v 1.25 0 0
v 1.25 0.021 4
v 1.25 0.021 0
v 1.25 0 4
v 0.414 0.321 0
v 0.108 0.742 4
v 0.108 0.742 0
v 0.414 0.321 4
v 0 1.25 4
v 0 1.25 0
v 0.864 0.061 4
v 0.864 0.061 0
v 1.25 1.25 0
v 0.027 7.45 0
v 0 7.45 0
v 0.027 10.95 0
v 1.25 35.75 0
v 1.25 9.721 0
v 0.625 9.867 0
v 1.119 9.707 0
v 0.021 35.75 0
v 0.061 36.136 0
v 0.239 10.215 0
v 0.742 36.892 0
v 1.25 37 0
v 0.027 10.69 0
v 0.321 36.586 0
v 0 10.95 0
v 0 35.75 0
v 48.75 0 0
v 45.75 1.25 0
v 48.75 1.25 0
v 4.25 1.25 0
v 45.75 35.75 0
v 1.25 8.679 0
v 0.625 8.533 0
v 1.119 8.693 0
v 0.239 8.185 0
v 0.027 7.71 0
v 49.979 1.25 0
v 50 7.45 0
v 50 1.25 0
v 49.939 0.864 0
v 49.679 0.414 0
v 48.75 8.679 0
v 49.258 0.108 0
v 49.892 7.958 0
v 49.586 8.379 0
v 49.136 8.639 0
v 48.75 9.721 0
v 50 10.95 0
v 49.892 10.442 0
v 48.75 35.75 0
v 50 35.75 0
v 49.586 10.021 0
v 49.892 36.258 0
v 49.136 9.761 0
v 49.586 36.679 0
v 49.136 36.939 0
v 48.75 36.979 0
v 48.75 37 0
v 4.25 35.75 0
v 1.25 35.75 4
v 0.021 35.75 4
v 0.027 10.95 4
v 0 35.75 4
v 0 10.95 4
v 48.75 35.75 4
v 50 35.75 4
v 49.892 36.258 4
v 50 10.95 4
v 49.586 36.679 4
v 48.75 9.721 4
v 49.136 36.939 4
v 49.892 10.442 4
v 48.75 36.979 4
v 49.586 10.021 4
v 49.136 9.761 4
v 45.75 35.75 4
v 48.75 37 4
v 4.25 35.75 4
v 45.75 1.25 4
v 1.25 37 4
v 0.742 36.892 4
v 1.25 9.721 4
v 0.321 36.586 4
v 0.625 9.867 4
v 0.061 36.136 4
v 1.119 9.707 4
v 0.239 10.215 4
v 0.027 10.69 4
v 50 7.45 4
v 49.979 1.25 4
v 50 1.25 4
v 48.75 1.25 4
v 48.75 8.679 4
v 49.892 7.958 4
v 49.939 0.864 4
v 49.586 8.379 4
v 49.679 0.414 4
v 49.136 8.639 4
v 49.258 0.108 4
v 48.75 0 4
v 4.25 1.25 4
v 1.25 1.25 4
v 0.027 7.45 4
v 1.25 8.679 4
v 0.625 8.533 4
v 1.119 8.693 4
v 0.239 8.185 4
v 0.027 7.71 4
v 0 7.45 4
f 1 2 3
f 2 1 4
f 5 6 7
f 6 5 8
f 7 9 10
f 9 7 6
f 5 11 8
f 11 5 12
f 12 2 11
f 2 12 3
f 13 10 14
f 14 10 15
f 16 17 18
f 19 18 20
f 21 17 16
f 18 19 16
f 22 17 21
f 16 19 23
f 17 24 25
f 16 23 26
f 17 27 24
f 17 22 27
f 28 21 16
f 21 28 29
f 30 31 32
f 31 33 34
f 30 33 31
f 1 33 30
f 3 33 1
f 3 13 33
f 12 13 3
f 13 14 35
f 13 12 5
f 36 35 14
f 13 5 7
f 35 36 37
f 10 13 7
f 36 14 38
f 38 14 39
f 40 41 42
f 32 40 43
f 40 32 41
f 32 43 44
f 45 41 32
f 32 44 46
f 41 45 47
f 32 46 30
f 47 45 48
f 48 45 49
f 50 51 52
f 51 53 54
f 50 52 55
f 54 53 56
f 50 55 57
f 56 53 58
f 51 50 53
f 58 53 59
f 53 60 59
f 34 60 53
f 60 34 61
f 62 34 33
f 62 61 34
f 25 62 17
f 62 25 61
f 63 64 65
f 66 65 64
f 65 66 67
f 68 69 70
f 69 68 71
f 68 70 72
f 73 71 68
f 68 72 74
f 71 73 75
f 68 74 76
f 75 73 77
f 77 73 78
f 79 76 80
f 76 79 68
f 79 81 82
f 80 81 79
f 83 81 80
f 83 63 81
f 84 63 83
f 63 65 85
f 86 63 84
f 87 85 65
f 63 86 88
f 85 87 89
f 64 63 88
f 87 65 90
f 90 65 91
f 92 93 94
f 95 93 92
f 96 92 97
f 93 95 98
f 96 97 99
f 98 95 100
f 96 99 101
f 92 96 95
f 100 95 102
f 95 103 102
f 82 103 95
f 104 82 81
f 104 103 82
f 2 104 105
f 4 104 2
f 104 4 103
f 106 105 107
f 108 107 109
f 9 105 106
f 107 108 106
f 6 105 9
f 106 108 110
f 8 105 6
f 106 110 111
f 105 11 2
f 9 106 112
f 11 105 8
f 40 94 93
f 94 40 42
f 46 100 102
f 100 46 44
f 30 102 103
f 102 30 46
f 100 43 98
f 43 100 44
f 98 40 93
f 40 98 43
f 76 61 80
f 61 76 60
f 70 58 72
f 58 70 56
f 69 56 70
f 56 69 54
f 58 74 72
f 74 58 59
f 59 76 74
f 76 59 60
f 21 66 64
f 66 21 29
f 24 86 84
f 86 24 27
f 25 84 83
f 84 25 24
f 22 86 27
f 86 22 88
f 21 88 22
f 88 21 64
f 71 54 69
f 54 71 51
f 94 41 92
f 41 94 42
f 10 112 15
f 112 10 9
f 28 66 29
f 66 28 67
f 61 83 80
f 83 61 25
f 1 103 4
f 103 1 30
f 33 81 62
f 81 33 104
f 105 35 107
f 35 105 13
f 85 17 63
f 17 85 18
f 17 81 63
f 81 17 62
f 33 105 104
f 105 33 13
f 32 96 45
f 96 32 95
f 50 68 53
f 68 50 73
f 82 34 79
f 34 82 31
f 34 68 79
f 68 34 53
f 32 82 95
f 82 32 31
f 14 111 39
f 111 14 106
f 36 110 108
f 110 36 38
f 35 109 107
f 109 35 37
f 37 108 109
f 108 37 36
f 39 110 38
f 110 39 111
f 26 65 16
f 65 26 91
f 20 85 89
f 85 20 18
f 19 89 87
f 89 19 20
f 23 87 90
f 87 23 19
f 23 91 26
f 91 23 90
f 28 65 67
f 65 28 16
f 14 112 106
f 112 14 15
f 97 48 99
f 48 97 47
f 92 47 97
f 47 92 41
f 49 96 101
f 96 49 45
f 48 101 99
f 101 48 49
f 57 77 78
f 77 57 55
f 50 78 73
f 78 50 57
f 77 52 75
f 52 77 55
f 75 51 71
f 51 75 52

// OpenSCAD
/* [General Settings] */

// Inner width in mm
innerWidth = 45;

// Strap width in mm
strapWidth = 30;

// Strap thickness of the left Strap in mm
strap1Thickness = 0.5;
// Same as left strap when zero
strap2Thickness = 0;

// Size of the left opening in mm
opening1 = 1;
// Same as left opening when zero
opening2 = 0;

// Share of height (may look odd with very small or very big values)
opening1Position = 0.8; // [0:0.01:1]
opening2Position = 0.8; // [0:0.01:1]

// Clip length in mm
length = 4;

/* [Print settings] */

// Wall thickness of the clip in mm
thickness = 2.5;

// Imprecision margin in mm
margin = 1;

// Start with a small value to preview, increase just before rendering
resolution = 15;

/* [Hidden] */
$fn = resolution;

module makeouter() {
	strap2Thickness =   strap2Thickness == 0 ? strap1Thickness : strap2Thickness;
	opening2 = opening2 == 0 ? opening1 : opening2;

	innerHeight = strapWidth + 2 * margin;

	outerWidth = innerWidth + strap1Thickness + strap2Thickness + 4 * margin;
	outerHeight = 2 * thickness + innerHeight;
	
	strapHoleHeight = strapWidth + 2 * margin + thickness;

	strapHole1Width = strap1Thickness * margin + thickness;
	strapHole2Width = strap2Thickness * margin + thickness;
	
	opening1Height = opening1 * margin;
	opening2Height = opening2 * margin;
	
	placeOpening1 = thickness + (innerHeight - opening1Height) * (1 - opening1Position);
	placeOpening2 = thickness + (innerHeight - opening2Height) * (1 - opening2Position);

	difference() {
		difference() {
			cube([outerWidth, outerHeight, length]);
			union() {
				translate([-thickness/2,0,0]) {
					//vRoundPlus(outerHeight, length, thickness);
				}
				translate([outerWidth + thickness/2,0,0]) {
					//mirror([1,0,0]) {
					//	vRoundPlus(outerHeight, length, thickness);
					//}
				}
				//hRoundPlus(outerWidth, length, thickness);
				translate([0,outerHeight,0]) {
					//mirror([0,1,0]) {
					//	hRoundPlus(outerWidth, length, thickness);
					//}
				}
				translate([thickness/2,thickness/2,0]) {
					cutEdge(length, thickness,180);
				}
				translate([outerWidth - thickness/2,thickness/2,0]) {
					cutEdge(length, thickness,270);
				}
				translate([outerWidth - thickness/2,outerHeight - thickness/2,0]) {
					cutEdge(length, thickness,0);
				}
				translate([thickness/2,outerHeight - thickness/2,0]) {
					cutEdge(length, thickness,90);
				}
			}				
		}
		union() {
			translate([thickness/2,thickness/2,0]) {
				strapHole(strapHole1Width, strapHoleHeight, length, thickness);
			}
			translate([outerWidth - strapHole2Width - thickness/2,thickness/2,0]) {
				strapHole(strapHole2Width, strapHoleHeight, length, thickness);
			}
			makeOpenings(outerHeight, outerWidth, placeOpening1, placeOpening2, opening1, opening2, opening1Height, opening2Height, length, thickness);
		}
	}
}

module strapHole(strapHoleWidth, strapHoleHeight, length, thickness) {
	
	translate([0, 0, -1]) {
		difference() {
			cube([strapHoleWidth, strapHoleHeight, length + 2]);
			union() {
				vRoundMinus(strapHoleHeight, length, thickness);
				translate([strapHoleWidth,0,0]) {
					vRoundMinus(strapHoleHeight, length, thickness);
				}
				hRoundMinus(strapHoleWidth, length, thickness);
				translate([0,strapHoleHeight,0]) {
					hRoundMinus(strapHoleWidth, length, thickness);
				}
			}
		}
	}
}

module opening(opening, openingHeight, length, thickness) {
	
	translate([-1, -thickness/2, -1]) {
		difference() {
			cube([thickness + 2, openingHeight + thickness, length + 2]);
			translate([thickness/2 + 1,0,1]) {
				pillar(length, thickness);
				translate([0,openingHeight + thickness,0]) {
					pillar(length, thickness);
				}
			}
		}
	}
}

module makeOpenings(outerHeight, outerWidth, placeOpening1, placeOpening2, opening1, opening2, opening1Height, opening2Height, length, thickness) {
	difference() {
		union() {
			translate([0,placeOpening1,0]) {
				opening(opening1, opening1Height, length, thickness);
			}
			translate([outerWidth - thickness,placeOpening2,0]) {
				opening(opening2, opening2Height, length, thickness);
			}
		}
		translate([thickness/2,-1,-2]) {
			cube([outerWidth - thickness,thickness + 1,length + 4]);
		}
		translate([thickness/2,outerHeight - thickness,-2]) {
			cube([outerWidth - thickness,thickness + 1,length + 4]);
		}
	}
}

module vRoundPlus(y, z, thickness) {
	translate([-1,-1,-1]) {
		difference() {
			cube([thickness + 1, y + 2, z + 2]);
			translate([thickness + 1,0,thickness/2 + 1]) {
				rotate([-90,0,0]) {
					//cylinder(d=thickness, h=y + 2);
				}
			}
			translate([thickness + 1,0,length + 1 - thickness/2]) {
				rotate([-90,0,0]) {
					//cylinder(d=thickness, h=y + 2);
				}
			}
			translate([thickness/2 + 1,0,thickness/2 + 1]) {
				cube([thickness/2,y + 2,z - thickness]);
			}
		}
	}
}

module hRoundPlus(x, z, thickness) {
	translate([-1,-thickness/2 -1,-1]) {
		difference() {
			cube([x + 2, thickness + 1, z + 2]);
			translate([0,thickness + 1,thickness/2 + 1]) {
				rotate([0,90,0]) {
					//cylinder(d=thickness, h=x + 2);
				}
			}
			translate([0,thickness + 1,length + 1 - thickness/2]) {
				rotate([0,90,0]) {
					//cylinder(d=thickness, h=x + 2);
				}
			}
			translate([0,thickness/2 + 1,thickness/2 + 1]) {
				cube([x + 2, thickness/2,z - thickness]);
			}
		}
	}
}

module vRoundMinus(y, z, thickness) {
	translate([0,-1,thickness/2 + 1]) {
		rotate([-90,0,0]) {
			//cylinder(d=thickness, h=y + 2);
		}
	}
	translate([0,-1,length + 1 - thickness/2]) {
		rotate([-90,0,0]) {
			//cylinder(d=thickness, h=y + 2);
		}
	}
	translate([-thickness/2,-1,thickness/2 + 1]) {
		//cube([thickness,y + 2,z - thickness]);
	}
}

module hRoundMinus(x, z, thickness) {
	translate([-1,0,thickness/2 + 1]) {
		rotate([0,90,0]) {
			//cylinder(d=thickness, h=x + 2);
		}
	}
	translate([-1,0,length + 1 - thickness/2]) {
		rotate([0,90,0]) {
			//cylinder(d=thickness, h=x + 2);
		}
	}
	translate([-1,-thickness/2,thickness/2 + 1]) {
		//cube([x + 2,thickness,z - thickness]);
	}
}

module cutEdge(length, thickness, rotation) {
	rotate([0,0,rotation]) {
		difference() {
			translate([0,0,-1]) {
				cube([thickness,thickness,length+2]);
			}
			pillar(length, thickness);
		}
	}
}

module pillar(length, thickness) {
	union() {
		translate([0,0,0]) {
			cylinder(d=thickness, h=length);
			//sphere(d=thickness);
		}
		//translate([0,0,length-thickness/2]) {
			//sphere(d=thickness);
		//}
	}
}

makeouter();
